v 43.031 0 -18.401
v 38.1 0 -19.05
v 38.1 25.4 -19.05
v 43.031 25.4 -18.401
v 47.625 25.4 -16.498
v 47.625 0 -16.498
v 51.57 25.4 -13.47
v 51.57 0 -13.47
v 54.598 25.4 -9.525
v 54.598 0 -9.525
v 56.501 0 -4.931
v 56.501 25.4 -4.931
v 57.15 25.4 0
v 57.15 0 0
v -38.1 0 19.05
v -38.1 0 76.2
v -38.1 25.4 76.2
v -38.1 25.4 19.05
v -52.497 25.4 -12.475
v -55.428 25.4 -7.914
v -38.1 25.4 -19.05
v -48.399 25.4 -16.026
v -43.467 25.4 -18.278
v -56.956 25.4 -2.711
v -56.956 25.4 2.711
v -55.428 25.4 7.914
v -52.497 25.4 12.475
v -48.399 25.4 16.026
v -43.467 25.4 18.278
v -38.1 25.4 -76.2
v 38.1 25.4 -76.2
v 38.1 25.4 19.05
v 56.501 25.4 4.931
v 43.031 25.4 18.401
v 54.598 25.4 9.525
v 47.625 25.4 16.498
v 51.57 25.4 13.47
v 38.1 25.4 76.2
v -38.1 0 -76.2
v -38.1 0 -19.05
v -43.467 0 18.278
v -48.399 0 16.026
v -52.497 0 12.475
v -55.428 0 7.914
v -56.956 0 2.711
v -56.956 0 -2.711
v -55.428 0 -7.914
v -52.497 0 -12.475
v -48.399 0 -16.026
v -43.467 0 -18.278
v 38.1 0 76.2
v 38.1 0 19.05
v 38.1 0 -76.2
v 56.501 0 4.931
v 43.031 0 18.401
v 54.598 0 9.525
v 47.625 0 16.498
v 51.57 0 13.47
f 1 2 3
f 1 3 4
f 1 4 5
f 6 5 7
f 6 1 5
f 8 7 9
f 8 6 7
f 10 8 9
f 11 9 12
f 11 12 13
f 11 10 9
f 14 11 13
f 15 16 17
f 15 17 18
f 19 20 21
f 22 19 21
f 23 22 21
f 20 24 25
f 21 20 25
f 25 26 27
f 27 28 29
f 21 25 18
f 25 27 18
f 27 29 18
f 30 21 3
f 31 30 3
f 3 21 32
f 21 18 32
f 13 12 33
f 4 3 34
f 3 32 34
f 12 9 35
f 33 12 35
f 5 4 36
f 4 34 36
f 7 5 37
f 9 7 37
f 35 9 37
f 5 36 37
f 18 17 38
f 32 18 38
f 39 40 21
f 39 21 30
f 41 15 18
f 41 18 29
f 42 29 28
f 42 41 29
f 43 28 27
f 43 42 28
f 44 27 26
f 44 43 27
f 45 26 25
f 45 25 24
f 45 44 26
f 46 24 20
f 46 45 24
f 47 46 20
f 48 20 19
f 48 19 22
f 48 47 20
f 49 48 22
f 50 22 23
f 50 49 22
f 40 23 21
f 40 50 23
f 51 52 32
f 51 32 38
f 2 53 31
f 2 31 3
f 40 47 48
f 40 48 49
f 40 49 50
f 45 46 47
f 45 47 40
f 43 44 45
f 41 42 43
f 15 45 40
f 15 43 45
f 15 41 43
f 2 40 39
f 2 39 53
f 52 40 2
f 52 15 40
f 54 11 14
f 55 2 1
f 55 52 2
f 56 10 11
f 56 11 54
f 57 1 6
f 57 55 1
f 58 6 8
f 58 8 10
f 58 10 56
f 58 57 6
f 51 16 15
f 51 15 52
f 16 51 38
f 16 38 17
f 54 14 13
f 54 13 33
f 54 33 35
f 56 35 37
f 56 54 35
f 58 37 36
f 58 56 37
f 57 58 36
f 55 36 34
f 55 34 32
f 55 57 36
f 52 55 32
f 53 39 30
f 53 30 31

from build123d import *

# Parameters (mm, degrees)
F1_DEPTH = 25.4


with BuildPart() as f1:
    # F0 (on Front) → F1 (new body)
    with BuildSketch(Plane.XZ):
        with BuildLine():
            Line((38.1, 19.05), (38.1, 76.2))
            Line((38.1, 76.2), (-38.1, 76.2))
            Line((-38.1, 76.2), (-38.1, 19.05))
            ThreePointArc((-38.1, 19.05), (-24.6296158184, 13.4703841816), (-19.05, 0))
            ThreePointArc((-19.05, 0), (-24.6296158184, -13.4703841816), (-38.1, -19.05))
            Line((-38.1, -19.05), (-38.1, -76.2))
            Line((-38.1, -76.2), (38.1, -76.2))
            Line((38.1, -76.2), (38.1, -19.05))
            ThreePointArc((38.1, -19.05), (19.05, 0), (38.1, 19.05))
        make_face()
        with BuildLine():
            ThreePointArc((57.15, 0), (51.5703841816, 13.4703841816), (38.1, 19.05))
            Line((38.1, 19.05), (38.1, -19.05))
            ThreePointArc((38.1, -19.05), (51.5703841816, -13.4703841816), (57.15, 0))
        make_face()
        with BuildLine():
            Line((38.1, -19.05), (38.1, 19.05))
            ThreePointArc((38.1, 19.05), (19.05, 0), (38.1, -19.05))
        make_face()
        with BuildLine():
            ThreePointArc((-19.05, 0), (-24.6296158184, 13.4703841816), (-38.1, 19.05))
            Line((-38.1, 19.05), (-38.1, -19.05))
            ThreePointArc((-38.1, -19.05), (-24.6296158184, -13.4703841816), (-19.05, 0))
        make_face()
        with BuildLine():
            Line((-38.1, -19.05), (-38.1, 19.05))
            ThreePointArc((-38.1, 19.05), (-57.15, 0), (-38.1, -19.05))
        make_face()
    extrude(amount=-F1_DEPTH)


solid = f1.part
